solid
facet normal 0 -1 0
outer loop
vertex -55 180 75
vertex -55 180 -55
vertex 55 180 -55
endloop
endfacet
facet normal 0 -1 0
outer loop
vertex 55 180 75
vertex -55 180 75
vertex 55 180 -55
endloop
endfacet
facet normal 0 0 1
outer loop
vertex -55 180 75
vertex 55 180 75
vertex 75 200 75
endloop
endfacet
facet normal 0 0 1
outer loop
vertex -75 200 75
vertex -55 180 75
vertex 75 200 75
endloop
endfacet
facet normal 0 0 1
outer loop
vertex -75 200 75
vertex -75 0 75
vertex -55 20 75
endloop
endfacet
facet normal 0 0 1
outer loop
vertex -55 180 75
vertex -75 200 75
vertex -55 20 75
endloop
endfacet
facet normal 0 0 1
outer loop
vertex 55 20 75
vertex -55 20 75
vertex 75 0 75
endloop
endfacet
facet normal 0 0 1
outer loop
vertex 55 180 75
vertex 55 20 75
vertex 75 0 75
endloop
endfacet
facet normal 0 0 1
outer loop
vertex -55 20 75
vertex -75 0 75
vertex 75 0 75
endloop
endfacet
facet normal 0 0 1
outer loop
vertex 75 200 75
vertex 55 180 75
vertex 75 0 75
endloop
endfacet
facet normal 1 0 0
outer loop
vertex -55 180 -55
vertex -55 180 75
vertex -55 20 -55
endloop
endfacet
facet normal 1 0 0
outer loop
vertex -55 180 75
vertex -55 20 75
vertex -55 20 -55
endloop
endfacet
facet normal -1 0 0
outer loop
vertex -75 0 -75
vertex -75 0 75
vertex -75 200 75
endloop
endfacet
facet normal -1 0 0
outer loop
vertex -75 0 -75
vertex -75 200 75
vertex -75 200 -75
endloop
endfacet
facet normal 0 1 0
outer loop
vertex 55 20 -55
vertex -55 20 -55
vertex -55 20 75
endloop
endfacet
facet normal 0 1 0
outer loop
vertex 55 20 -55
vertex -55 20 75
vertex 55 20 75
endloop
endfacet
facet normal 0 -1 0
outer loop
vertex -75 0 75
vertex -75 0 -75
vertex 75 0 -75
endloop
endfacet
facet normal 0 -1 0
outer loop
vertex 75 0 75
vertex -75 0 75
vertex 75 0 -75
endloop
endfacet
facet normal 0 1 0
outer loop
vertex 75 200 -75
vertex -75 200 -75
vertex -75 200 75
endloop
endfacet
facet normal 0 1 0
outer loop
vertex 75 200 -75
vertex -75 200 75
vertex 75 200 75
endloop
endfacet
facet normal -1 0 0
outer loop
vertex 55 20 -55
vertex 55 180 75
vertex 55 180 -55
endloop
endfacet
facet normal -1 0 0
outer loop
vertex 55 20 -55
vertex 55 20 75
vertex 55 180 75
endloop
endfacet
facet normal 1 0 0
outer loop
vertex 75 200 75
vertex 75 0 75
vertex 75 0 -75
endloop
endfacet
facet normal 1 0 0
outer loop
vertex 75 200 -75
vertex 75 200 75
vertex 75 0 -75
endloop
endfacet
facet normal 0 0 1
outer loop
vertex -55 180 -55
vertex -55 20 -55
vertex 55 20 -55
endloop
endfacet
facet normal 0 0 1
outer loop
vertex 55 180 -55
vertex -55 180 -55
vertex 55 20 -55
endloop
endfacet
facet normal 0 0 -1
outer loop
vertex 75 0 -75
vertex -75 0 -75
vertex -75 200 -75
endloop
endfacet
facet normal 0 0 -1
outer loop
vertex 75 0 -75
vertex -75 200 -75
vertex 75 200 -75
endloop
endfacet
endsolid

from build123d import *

# Parameters (mm, degrees)
SKETCH_1_W      = 150
SKETCH_1_H      = 150
EXTRUDE_1_DEPTH = 200
SHELL_1_T       = -20


with BuildPart() as part:
    # 草图1 → 凸台-拉伸1 (new body)
    with BuildSketch(Plane(origin=(0, 0, 0), x_dir=(1, 0, 0), z_dir=(0, 1, 0))):
        Rectangle(SKETCH_1_W, SKETCH_1_H)
    extrude(amount=EXTRUDE_1_DEPTH)

    # 抽壳1
    shell_1_openings = [part.faces().sort_by_distance(p)[0] for p in [
        (0, 100, 75),
    ]]
    offset(amount=SHELL_1_T, openings=shell_1_openings, kind=Kind.INTERSECTION)


solid = part.part
